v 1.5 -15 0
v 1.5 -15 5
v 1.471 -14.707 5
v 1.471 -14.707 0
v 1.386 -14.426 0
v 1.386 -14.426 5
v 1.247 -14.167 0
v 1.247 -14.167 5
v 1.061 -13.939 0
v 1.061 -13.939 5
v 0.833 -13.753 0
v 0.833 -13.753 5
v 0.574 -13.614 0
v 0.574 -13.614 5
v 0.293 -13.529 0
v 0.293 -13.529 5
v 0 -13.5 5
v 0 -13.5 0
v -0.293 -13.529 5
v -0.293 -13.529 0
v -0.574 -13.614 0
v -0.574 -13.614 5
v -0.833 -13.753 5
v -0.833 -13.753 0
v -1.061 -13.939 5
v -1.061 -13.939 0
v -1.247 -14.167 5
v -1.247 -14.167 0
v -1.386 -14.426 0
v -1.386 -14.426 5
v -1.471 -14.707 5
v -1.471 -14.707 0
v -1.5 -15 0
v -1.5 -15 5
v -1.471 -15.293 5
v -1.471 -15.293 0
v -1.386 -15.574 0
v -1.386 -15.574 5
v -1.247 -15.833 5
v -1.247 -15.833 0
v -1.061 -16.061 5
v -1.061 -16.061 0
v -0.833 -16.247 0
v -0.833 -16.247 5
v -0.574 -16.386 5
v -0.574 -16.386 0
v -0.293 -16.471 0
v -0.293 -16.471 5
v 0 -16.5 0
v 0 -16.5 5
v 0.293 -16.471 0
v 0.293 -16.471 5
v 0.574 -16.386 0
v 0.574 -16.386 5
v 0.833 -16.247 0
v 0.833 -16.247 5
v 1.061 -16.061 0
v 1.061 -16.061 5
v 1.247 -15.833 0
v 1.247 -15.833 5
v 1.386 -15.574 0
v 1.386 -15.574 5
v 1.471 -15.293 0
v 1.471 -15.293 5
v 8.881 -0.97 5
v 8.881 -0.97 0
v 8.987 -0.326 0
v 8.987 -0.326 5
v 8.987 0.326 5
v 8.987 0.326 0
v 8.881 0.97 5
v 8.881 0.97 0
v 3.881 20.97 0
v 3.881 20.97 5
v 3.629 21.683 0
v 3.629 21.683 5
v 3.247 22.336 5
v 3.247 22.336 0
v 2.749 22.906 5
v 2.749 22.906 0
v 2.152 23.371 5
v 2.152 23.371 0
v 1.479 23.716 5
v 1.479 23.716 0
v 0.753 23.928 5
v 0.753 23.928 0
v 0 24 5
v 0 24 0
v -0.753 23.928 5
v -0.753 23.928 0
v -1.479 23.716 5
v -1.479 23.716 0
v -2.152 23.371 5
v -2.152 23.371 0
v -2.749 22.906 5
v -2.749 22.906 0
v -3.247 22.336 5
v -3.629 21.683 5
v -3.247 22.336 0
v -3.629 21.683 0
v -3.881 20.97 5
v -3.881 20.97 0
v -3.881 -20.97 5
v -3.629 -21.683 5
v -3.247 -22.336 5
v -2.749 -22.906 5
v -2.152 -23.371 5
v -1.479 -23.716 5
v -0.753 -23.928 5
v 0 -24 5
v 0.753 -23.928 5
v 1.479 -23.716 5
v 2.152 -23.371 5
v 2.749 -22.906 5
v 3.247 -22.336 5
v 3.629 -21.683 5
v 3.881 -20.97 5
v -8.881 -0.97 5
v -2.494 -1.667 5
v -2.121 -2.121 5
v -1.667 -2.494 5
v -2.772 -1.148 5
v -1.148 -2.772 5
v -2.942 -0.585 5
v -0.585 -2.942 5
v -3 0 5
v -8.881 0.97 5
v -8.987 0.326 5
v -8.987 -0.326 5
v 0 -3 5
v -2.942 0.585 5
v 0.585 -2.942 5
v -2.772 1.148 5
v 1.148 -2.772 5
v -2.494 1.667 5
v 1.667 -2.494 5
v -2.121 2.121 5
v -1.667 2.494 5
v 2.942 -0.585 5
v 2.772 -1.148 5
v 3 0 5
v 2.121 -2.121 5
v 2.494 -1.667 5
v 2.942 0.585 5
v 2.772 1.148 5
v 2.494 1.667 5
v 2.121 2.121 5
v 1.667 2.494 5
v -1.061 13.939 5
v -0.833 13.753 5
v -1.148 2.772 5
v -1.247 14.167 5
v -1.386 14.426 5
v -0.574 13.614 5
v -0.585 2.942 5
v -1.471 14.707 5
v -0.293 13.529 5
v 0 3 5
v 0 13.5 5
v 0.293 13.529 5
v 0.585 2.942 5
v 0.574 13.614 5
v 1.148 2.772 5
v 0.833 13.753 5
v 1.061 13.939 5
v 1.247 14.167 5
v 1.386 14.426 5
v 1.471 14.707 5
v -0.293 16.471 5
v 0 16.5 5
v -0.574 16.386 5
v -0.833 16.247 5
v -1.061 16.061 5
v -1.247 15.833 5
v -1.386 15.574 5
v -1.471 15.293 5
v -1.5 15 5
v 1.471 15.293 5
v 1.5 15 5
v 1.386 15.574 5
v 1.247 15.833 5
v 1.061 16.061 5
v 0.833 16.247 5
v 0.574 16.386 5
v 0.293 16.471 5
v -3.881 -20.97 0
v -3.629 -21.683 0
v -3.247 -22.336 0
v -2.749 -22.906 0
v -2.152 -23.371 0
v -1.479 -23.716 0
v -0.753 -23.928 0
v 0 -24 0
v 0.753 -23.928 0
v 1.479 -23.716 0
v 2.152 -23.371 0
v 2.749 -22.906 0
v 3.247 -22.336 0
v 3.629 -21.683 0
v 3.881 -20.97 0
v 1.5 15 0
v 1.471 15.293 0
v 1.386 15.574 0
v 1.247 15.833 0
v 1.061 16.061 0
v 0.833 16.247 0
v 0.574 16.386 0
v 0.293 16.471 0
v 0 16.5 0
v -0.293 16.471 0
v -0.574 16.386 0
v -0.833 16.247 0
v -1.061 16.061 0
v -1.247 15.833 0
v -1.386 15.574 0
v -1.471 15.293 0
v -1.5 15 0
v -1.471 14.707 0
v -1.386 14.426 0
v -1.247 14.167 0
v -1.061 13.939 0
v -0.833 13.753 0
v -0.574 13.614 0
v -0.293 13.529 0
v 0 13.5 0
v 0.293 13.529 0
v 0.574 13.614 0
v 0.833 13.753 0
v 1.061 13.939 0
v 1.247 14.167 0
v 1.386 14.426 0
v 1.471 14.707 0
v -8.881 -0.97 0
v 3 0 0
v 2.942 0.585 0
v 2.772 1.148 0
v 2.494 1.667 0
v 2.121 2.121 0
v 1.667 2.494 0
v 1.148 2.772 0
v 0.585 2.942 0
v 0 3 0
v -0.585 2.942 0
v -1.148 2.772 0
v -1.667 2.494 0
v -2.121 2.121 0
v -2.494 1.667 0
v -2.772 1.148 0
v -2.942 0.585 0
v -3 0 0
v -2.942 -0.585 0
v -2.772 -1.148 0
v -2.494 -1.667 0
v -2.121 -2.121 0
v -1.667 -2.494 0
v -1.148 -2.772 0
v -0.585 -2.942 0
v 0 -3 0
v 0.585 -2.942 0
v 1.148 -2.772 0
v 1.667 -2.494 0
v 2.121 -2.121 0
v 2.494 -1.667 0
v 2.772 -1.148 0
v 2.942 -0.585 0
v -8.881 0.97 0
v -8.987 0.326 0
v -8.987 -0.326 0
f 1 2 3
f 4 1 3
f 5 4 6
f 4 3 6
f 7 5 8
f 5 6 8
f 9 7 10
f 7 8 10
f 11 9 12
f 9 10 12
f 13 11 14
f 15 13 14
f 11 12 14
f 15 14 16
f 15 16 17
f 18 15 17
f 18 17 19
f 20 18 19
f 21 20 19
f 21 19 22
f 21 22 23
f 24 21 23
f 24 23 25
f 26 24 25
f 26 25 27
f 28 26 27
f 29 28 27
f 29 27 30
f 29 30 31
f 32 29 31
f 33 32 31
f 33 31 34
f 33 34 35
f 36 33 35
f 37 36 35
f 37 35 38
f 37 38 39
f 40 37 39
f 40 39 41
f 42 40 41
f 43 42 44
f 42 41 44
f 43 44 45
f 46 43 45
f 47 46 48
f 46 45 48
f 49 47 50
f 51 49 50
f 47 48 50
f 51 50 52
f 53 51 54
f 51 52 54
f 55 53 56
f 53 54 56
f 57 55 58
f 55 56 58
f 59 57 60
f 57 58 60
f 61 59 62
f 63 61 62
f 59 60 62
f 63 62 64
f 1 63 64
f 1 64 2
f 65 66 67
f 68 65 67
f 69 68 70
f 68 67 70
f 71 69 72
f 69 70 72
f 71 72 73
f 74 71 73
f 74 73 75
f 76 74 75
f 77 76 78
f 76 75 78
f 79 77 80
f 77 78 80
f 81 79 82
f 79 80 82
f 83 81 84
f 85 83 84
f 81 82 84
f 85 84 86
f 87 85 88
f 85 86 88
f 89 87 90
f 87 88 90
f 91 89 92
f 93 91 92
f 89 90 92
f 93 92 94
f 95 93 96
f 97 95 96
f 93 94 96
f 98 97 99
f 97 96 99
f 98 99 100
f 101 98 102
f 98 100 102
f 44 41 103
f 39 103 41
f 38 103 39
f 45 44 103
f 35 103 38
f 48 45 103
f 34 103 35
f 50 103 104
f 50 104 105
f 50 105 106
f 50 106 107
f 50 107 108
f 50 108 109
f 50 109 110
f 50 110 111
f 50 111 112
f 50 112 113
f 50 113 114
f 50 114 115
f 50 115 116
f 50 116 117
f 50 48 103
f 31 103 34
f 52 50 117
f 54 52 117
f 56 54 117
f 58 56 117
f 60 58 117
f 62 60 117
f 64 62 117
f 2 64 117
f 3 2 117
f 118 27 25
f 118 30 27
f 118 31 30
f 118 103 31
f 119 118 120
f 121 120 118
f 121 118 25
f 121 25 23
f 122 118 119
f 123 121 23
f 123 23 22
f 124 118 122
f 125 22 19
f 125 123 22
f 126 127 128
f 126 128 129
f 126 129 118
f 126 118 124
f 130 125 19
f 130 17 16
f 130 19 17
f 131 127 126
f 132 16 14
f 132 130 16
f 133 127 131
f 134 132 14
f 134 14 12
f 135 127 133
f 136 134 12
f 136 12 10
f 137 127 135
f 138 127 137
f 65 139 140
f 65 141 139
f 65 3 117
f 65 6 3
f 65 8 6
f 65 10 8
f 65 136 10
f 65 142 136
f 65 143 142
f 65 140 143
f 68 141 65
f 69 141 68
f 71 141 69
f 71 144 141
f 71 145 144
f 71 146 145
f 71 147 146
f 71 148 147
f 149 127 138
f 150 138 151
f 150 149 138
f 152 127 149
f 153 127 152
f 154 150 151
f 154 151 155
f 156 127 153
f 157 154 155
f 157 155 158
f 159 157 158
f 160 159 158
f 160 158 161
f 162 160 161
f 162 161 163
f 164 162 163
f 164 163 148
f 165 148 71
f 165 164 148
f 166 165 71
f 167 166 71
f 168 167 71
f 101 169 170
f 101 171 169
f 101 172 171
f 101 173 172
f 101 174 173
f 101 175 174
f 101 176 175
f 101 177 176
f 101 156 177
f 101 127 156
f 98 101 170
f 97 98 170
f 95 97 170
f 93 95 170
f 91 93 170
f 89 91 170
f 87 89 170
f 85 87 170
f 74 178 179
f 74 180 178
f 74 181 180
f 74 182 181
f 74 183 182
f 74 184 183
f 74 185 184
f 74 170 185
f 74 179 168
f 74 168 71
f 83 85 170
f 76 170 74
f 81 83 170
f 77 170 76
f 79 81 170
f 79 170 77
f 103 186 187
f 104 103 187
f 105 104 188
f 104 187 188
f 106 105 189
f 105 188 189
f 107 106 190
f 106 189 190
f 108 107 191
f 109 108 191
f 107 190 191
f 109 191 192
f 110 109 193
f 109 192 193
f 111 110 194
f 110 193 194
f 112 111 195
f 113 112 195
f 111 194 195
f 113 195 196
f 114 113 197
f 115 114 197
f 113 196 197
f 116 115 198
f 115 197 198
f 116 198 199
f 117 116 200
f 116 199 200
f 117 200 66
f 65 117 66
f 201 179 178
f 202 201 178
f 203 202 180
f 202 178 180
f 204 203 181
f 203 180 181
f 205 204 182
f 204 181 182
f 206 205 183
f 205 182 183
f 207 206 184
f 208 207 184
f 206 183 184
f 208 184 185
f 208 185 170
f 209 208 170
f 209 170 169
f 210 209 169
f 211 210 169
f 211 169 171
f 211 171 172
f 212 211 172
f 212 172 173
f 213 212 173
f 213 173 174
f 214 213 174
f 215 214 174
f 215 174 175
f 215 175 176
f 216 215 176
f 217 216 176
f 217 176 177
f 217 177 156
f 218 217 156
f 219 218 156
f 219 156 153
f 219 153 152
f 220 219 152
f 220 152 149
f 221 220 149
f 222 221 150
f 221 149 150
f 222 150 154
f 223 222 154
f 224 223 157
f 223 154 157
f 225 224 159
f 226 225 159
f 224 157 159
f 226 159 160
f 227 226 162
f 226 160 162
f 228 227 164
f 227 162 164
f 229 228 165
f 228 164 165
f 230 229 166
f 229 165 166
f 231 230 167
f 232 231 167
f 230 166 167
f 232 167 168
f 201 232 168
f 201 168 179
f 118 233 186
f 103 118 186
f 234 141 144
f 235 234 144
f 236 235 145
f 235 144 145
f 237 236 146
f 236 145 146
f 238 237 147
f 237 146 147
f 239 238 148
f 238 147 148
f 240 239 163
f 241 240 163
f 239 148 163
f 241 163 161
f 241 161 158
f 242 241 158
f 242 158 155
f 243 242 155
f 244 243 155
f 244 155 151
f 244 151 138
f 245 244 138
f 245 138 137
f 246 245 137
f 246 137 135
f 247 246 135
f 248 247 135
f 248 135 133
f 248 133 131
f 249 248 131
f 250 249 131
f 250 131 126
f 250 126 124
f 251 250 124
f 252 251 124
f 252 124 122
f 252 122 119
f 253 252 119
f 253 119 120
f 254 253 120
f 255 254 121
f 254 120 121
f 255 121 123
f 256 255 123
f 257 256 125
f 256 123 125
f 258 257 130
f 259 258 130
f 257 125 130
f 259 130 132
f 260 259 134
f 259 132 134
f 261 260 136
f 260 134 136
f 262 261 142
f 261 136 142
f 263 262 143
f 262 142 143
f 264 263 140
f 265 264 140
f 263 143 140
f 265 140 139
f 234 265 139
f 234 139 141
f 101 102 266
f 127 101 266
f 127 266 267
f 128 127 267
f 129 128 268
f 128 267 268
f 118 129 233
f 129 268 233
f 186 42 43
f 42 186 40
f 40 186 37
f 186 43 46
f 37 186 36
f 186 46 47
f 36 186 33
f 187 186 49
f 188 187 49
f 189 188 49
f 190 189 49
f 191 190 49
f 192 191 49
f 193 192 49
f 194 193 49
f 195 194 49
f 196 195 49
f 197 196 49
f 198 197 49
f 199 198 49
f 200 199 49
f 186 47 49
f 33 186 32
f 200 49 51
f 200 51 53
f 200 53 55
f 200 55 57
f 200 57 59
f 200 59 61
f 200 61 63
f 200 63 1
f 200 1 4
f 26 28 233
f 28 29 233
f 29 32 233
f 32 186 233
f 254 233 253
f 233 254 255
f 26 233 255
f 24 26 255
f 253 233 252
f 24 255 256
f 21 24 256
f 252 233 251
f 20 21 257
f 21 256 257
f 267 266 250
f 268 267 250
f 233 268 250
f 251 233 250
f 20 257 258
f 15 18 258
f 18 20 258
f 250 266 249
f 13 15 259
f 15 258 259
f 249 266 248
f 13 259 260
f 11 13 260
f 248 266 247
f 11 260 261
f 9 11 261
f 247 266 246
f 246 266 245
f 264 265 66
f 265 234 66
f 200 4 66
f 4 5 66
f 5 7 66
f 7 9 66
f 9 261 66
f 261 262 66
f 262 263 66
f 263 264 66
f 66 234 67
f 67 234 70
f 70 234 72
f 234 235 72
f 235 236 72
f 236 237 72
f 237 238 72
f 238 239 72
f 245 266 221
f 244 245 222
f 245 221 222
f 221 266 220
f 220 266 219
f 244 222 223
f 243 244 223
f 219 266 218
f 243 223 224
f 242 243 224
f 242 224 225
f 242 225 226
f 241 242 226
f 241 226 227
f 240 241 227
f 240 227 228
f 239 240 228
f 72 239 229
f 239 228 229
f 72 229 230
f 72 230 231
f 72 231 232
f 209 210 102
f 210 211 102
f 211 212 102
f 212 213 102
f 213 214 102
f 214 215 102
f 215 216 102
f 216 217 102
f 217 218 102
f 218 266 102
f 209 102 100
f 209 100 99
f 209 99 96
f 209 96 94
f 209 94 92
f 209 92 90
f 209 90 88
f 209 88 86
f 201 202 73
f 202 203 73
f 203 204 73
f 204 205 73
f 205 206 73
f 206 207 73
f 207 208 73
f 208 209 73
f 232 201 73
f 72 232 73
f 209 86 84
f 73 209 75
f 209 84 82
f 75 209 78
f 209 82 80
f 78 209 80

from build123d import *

# Parameters (mm, degrees)
EXTRUDE_1_DEPTH     = 5
SKETCH_2_R          = 3
CUT_EXTRUDE_2_DEPTH = 27.115129714
SKETCH_3_R          = 1.5
CUT_EXTRUDE_3_DEPTH = 100


with BuildPart() as part:
    # 草圖1 → 伸長1 (new body)
    with BuildSketch(Plane.XY):
        with BuildLine():
            Line((-3.880570001, 20.9701425), (-8.880570001, 0.9701425))
            ThreePointArc((-8.880570001, 0.9701425), (-9, 0), (-8.880570001, -0.9701425))
            Line((-8.880570001, -0.9701425), (-3.880570001, -20.9701425))
            ThreePointArc((-3.880570001, -20.9701425), (0, -24), (3.880570001, -20.9701425))
            Line((3.880570001, -20.9701425), (8.880570001, -0.9701425))
            ThreePointArc((8.880570001, -0.9701425), (9, 0), (8.880570001, 0.9701425))
            Line((8.880570001, 0.9701425), (3.880570001, 20.9701425))
            ThreePointArc((3.880570001, 20.9701425), (0, 24), (-3.880570001, 20.9701425))
        make_face()
    extrude(amount=EXTRUDE_1_DEPTH)

    # 草圖2 → 伸長2 (cut, through all)
    with BuildSketch(Plane.XY.offset(5)):
        Circle(SKETCH_2_R)
    extrude(amount=-CUT_EXTRUDE_2_DEPTH, mode=Mode.SUBTRACT)

    # 草圖3 → 伸長3 (cut)
    with BuildSketch(Plane.XY.offset(5)):
        with Locations((0, 15)):
            Circle(SKETCH_3_R)
        with Locations((0, -15)):
            Circle(SKETCH_3_R)
    extrude(amount=-CUT_EXTRUDE_3_DEPTH, mode=Mode.SUBTRACT)


solid = part.part
